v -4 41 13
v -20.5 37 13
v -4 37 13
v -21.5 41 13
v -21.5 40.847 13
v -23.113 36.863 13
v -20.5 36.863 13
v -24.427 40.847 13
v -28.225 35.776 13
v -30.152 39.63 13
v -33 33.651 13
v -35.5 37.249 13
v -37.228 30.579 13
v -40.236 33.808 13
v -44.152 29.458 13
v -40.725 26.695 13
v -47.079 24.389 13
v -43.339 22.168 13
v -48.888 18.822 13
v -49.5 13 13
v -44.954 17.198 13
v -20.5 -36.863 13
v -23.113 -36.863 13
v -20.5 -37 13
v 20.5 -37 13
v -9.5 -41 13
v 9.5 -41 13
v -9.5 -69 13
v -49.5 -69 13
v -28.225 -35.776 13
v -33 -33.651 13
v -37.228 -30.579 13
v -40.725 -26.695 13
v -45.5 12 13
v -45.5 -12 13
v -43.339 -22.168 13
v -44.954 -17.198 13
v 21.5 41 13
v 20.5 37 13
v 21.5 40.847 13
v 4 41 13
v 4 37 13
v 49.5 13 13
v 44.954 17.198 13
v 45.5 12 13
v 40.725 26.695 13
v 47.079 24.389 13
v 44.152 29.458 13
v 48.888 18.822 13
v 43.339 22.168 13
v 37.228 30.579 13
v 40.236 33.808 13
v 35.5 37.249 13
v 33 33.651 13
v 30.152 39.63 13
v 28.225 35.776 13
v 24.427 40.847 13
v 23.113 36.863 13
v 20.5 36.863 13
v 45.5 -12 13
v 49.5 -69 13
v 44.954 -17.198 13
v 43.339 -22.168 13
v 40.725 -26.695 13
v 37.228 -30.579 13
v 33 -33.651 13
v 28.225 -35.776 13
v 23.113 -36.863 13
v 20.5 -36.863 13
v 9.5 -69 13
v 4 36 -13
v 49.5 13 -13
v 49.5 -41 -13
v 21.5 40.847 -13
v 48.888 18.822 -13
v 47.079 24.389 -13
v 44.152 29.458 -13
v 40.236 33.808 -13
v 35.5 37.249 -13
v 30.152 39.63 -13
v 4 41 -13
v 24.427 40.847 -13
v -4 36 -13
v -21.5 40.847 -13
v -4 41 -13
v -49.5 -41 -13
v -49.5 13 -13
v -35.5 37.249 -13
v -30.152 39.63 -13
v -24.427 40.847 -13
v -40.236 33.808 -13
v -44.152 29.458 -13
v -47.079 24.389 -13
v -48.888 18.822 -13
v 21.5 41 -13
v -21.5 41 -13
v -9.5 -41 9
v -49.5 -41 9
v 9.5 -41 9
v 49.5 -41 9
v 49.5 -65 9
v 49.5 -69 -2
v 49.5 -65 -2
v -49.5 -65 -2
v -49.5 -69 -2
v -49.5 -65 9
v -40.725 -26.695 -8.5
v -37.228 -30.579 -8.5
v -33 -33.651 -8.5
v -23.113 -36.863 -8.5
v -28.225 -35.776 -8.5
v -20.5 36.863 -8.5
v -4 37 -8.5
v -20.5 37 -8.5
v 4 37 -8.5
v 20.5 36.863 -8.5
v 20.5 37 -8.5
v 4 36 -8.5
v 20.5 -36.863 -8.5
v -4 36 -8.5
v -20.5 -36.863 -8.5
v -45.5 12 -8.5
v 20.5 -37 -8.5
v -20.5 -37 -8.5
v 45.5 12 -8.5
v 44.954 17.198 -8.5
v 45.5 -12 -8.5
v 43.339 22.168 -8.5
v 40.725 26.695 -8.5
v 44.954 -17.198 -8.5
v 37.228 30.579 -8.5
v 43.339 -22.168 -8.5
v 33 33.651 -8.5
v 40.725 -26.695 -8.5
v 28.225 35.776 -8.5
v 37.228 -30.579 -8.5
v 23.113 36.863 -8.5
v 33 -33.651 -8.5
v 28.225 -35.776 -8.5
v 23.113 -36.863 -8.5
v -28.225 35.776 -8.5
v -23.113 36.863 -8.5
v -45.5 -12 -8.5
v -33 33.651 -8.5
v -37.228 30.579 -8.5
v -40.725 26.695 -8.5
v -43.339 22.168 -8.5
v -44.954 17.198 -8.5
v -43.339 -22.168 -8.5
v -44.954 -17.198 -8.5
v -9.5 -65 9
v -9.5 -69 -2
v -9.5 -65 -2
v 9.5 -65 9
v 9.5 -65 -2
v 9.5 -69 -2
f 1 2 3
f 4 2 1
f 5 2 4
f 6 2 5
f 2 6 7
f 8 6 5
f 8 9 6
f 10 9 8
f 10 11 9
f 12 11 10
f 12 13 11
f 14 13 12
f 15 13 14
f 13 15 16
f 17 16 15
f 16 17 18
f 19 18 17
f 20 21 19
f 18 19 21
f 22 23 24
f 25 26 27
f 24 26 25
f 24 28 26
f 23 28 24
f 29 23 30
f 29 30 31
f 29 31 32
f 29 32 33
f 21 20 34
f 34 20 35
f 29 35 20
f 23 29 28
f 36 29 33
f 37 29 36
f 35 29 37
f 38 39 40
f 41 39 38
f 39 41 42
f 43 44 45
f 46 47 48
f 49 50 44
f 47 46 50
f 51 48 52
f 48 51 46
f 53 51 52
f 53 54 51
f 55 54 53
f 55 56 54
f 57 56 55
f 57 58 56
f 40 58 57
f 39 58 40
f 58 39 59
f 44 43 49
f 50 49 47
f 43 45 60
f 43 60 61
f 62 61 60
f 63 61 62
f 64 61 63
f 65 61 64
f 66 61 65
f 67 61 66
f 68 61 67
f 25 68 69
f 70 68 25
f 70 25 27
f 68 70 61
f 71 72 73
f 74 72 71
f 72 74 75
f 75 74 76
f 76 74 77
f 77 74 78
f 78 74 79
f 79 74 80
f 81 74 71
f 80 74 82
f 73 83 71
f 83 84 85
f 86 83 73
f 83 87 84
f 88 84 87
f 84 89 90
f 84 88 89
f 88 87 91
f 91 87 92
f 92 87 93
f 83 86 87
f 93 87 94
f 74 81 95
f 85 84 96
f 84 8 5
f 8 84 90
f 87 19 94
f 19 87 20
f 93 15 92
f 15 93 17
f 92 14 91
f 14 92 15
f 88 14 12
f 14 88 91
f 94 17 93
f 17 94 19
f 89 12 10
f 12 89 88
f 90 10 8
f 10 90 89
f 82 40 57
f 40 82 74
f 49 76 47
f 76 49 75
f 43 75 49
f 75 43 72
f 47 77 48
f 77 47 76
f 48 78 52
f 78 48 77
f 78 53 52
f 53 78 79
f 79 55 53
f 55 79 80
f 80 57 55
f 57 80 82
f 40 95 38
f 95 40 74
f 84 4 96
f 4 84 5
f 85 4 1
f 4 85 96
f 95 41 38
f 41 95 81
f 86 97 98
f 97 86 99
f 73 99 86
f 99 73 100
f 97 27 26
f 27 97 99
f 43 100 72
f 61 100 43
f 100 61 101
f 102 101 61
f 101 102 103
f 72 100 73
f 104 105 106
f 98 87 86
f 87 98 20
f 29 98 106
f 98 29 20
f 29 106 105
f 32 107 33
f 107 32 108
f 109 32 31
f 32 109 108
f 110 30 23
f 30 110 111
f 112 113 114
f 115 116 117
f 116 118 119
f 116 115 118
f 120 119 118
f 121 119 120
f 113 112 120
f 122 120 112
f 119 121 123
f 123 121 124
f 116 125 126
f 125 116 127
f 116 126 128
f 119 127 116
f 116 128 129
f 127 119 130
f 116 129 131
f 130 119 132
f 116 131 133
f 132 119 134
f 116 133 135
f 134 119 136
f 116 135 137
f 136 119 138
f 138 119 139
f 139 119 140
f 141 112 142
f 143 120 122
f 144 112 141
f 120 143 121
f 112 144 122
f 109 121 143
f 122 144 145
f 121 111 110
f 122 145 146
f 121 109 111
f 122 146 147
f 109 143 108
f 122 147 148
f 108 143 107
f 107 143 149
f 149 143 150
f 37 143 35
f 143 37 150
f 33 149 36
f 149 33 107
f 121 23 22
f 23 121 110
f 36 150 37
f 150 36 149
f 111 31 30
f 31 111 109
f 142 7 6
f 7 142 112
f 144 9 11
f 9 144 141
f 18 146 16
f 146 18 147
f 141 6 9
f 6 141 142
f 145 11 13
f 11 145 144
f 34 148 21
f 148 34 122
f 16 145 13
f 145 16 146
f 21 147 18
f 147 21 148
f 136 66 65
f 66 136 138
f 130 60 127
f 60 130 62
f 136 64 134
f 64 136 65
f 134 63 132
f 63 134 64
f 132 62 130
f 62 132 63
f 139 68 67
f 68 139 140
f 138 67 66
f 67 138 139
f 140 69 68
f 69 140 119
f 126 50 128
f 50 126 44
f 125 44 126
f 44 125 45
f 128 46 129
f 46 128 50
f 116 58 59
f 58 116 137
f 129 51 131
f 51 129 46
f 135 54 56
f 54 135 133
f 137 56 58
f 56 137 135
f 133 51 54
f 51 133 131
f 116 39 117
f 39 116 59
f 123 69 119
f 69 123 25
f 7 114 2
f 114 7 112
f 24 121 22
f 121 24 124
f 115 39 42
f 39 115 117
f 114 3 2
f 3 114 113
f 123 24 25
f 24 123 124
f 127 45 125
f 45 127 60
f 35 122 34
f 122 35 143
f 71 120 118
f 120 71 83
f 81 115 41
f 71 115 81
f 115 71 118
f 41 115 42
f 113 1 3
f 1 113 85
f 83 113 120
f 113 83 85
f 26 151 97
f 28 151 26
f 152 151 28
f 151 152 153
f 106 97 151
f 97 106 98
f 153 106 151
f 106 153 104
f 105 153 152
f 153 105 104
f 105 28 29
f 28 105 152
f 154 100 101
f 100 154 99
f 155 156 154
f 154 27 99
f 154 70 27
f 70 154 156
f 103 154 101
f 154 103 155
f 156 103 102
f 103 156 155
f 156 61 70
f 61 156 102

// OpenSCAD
include <MCAD/boxes.scad>

// Created by Jeremy Herrman ( @jherrm, jeremy@jherrman.com )
// Sept 2011

module LaptopArm(w,l,h1,h2,gap) {
	wiggle = 1;
	wall = 4;

	//back
	cube([w,l,h2]);

	translate([0,-(gap+wall),h2-wall]) {
		// top
		cube([w,gap+wall,wall]);

		//front 
		translate([0,-wall,-h1+wall]) {
			cube([w,wall,h1]);
		}
	}
}

// define inner dimensions (how big the box will be inside)
// Dimensions are millimeters
w = 87;
l = 70;
h = 20;
cr = 25;
cable = 8;

wall = 6;
wiggle = 2; // wiggle room added to inside of box

//origins
o_x = -1*((w+wall*2)/2); // left
o_y = -1*((l+wall*2)/2); // front
o_z = -1*((h+wall)/2); // bottom

tab_w = 40;
tab_front_h = 15;
tab_back_h = h+wall;
tab_l = -1*o_y;
gap = 20;//change this number to adjust for laptop screen thickness

cable_guide_w = 8;
cable_guide_h = h+wall*2;

union() {
	difference() {
		// outside box needs to fit whatever object is defined above
		roundedBox([w+wall*2, l+wall*2, h+wall], cr + wall/2, true);

		union() {
			// inside box
			translate([0,0,((h+wall*2)/2) - ((h+wiggle*2)/2)]) roundedBox([w+wiggle*2, l+wiggle*2, h+wiggle*2+1], cr, true);

			// cable guide
			translate([0, -o_y-wall/2+1, o_z+cable_guide_h/2-wall/2]) {
				//rotate([90,0,0]) cylinder(wall/2+12,5,5);
				rotate([90,0,0]) roundedBox([cable_guide_w, cable_guide_h, wall], 2, true);
			}

		}
	}

	difference() {
		union() {
			translate([o_x,o_y,-o_z - tab_back_h]) {
				LaptopArm(tab_w,tab_l,tab_front_h,tab_back_h,gap);
			}
			translate([-o_x - tab_w,o_y,-o_z - tab_back_h]) {
				LaptopArm(tab_w,tab_l,tab_front_h,tab_back_h,gap);
			}
		}

		// inside box
		translate([0,0,((h+wall*2)/2) - ((h+wiggle*2)/2)]) roundedBox([w+wiggle*2, l+wiggle*2, h+wiggle*2+1], cr, true);
	}

}
